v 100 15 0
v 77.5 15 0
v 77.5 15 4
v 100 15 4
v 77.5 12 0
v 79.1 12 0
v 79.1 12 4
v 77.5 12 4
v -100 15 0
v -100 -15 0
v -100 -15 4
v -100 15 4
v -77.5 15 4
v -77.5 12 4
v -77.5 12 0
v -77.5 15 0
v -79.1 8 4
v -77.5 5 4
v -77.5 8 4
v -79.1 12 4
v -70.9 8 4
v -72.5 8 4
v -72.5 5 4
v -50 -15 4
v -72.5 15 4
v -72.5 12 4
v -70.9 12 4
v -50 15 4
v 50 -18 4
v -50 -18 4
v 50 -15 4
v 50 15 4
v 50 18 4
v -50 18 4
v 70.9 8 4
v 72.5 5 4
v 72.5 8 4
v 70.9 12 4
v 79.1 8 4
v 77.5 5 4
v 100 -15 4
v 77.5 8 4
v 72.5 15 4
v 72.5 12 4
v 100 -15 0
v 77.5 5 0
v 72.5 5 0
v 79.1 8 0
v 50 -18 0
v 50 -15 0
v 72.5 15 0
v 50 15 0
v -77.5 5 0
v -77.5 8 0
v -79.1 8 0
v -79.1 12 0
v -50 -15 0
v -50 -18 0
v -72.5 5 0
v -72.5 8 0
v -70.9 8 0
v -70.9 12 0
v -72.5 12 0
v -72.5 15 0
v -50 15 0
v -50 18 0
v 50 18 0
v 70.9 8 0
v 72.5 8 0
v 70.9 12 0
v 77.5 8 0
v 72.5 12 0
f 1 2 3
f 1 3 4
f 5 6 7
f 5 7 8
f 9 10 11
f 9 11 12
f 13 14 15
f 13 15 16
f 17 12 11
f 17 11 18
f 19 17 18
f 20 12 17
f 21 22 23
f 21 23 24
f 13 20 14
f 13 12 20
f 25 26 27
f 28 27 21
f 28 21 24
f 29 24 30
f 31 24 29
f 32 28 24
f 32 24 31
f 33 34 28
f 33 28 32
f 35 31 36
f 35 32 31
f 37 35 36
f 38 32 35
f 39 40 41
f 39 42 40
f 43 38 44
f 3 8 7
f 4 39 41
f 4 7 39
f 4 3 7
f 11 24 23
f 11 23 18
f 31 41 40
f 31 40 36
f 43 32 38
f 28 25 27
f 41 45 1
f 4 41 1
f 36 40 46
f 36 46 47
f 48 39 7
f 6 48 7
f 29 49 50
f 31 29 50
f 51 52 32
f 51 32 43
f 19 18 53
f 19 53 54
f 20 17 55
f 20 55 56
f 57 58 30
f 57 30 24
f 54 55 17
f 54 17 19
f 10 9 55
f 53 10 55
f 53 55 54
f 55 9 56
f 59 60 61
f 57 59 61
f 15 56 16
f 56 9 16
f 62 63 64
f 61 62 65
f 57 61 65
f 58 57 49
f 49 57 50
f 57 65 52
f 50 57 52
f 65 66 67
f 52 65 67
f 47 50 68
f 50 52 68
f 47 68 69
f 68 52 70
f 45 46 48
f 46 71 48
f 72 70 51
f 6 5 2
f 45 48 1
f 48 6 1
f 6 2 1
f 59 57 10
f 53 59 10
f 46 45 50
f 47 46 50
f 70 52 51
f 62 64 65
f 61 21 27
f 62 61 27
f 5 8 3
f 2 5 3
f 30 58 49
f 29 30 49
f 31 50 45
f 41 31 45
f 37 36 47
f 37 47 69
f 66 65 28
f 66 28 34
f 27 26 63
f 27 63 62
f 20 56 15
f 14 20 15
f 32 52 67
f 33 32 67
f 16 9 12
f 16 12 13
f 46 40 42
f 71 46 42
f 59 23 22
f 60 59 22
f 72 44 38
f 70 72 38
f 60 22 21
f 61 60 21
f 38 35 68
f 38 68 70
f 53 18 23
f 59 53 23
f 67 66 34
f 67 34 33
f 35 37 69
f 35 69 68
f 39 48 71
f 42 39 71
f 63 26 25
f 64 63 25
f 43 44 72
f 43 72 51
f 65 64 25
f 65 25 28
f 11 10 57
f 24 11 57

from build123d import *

# Parameters (mm, degrees)
SKETCH1_W           = 200
SKETCH1_H           = 30
SKETCH1_W_2         = 100
SKETCH1_H_2         = 6
BOSS_EXTRUDE1_DEPTH = 4
SKETCH2_W           = 5
SKETCH2_H           = 20
SKETCH2_W_2         = 8.2
SKETCH2_H_2         = 4
CUT_EXTRUDE1_DEPTH  = 10


with BuildPart() as part:
    # Sketch1 → Boss-Extrude1 (new body)
    with BuildSketch(Plane.XY):
        Rectangle(SKETCH1_W, SKETCH1_H)
        with Locations((0, -15)):
            Rectangle(SKETCH1_W_2, SKETCH1_H_2)
        with Locations((0, 15)):
            Rectangle(SKETCH1_W_2, SKETCH1_H_2)
    extrude(amount=BOSS_EXTRUDE1_DEPTH)

    # Sketch2 → Cut-Extrude1 (cut)
    with BuildSketch(Plane.XY.offset(4)):
        with Locations((-75, 15)):
            Rectangle(SKETCH2_W, SKETCH2_H)
        with Locations((-75, 10)):
            Rectangle(SKETCH2_W_2, SKETCH2_H_2)
    cut_extrude1 = extrude(amount=-CUT_EXTRUDE1_DEPTH, mode=Mode.SUBTRACT)

    # Mirror1: Cut-Extrude1 across plane
    add(cut_extrude1.mirror(Plane(origin=(0, 0, 0), x_dir=(0, 0, 1), z_dir=(1, 0, 0))), mode=Mode.SUBTRACT)


solid = part.part
